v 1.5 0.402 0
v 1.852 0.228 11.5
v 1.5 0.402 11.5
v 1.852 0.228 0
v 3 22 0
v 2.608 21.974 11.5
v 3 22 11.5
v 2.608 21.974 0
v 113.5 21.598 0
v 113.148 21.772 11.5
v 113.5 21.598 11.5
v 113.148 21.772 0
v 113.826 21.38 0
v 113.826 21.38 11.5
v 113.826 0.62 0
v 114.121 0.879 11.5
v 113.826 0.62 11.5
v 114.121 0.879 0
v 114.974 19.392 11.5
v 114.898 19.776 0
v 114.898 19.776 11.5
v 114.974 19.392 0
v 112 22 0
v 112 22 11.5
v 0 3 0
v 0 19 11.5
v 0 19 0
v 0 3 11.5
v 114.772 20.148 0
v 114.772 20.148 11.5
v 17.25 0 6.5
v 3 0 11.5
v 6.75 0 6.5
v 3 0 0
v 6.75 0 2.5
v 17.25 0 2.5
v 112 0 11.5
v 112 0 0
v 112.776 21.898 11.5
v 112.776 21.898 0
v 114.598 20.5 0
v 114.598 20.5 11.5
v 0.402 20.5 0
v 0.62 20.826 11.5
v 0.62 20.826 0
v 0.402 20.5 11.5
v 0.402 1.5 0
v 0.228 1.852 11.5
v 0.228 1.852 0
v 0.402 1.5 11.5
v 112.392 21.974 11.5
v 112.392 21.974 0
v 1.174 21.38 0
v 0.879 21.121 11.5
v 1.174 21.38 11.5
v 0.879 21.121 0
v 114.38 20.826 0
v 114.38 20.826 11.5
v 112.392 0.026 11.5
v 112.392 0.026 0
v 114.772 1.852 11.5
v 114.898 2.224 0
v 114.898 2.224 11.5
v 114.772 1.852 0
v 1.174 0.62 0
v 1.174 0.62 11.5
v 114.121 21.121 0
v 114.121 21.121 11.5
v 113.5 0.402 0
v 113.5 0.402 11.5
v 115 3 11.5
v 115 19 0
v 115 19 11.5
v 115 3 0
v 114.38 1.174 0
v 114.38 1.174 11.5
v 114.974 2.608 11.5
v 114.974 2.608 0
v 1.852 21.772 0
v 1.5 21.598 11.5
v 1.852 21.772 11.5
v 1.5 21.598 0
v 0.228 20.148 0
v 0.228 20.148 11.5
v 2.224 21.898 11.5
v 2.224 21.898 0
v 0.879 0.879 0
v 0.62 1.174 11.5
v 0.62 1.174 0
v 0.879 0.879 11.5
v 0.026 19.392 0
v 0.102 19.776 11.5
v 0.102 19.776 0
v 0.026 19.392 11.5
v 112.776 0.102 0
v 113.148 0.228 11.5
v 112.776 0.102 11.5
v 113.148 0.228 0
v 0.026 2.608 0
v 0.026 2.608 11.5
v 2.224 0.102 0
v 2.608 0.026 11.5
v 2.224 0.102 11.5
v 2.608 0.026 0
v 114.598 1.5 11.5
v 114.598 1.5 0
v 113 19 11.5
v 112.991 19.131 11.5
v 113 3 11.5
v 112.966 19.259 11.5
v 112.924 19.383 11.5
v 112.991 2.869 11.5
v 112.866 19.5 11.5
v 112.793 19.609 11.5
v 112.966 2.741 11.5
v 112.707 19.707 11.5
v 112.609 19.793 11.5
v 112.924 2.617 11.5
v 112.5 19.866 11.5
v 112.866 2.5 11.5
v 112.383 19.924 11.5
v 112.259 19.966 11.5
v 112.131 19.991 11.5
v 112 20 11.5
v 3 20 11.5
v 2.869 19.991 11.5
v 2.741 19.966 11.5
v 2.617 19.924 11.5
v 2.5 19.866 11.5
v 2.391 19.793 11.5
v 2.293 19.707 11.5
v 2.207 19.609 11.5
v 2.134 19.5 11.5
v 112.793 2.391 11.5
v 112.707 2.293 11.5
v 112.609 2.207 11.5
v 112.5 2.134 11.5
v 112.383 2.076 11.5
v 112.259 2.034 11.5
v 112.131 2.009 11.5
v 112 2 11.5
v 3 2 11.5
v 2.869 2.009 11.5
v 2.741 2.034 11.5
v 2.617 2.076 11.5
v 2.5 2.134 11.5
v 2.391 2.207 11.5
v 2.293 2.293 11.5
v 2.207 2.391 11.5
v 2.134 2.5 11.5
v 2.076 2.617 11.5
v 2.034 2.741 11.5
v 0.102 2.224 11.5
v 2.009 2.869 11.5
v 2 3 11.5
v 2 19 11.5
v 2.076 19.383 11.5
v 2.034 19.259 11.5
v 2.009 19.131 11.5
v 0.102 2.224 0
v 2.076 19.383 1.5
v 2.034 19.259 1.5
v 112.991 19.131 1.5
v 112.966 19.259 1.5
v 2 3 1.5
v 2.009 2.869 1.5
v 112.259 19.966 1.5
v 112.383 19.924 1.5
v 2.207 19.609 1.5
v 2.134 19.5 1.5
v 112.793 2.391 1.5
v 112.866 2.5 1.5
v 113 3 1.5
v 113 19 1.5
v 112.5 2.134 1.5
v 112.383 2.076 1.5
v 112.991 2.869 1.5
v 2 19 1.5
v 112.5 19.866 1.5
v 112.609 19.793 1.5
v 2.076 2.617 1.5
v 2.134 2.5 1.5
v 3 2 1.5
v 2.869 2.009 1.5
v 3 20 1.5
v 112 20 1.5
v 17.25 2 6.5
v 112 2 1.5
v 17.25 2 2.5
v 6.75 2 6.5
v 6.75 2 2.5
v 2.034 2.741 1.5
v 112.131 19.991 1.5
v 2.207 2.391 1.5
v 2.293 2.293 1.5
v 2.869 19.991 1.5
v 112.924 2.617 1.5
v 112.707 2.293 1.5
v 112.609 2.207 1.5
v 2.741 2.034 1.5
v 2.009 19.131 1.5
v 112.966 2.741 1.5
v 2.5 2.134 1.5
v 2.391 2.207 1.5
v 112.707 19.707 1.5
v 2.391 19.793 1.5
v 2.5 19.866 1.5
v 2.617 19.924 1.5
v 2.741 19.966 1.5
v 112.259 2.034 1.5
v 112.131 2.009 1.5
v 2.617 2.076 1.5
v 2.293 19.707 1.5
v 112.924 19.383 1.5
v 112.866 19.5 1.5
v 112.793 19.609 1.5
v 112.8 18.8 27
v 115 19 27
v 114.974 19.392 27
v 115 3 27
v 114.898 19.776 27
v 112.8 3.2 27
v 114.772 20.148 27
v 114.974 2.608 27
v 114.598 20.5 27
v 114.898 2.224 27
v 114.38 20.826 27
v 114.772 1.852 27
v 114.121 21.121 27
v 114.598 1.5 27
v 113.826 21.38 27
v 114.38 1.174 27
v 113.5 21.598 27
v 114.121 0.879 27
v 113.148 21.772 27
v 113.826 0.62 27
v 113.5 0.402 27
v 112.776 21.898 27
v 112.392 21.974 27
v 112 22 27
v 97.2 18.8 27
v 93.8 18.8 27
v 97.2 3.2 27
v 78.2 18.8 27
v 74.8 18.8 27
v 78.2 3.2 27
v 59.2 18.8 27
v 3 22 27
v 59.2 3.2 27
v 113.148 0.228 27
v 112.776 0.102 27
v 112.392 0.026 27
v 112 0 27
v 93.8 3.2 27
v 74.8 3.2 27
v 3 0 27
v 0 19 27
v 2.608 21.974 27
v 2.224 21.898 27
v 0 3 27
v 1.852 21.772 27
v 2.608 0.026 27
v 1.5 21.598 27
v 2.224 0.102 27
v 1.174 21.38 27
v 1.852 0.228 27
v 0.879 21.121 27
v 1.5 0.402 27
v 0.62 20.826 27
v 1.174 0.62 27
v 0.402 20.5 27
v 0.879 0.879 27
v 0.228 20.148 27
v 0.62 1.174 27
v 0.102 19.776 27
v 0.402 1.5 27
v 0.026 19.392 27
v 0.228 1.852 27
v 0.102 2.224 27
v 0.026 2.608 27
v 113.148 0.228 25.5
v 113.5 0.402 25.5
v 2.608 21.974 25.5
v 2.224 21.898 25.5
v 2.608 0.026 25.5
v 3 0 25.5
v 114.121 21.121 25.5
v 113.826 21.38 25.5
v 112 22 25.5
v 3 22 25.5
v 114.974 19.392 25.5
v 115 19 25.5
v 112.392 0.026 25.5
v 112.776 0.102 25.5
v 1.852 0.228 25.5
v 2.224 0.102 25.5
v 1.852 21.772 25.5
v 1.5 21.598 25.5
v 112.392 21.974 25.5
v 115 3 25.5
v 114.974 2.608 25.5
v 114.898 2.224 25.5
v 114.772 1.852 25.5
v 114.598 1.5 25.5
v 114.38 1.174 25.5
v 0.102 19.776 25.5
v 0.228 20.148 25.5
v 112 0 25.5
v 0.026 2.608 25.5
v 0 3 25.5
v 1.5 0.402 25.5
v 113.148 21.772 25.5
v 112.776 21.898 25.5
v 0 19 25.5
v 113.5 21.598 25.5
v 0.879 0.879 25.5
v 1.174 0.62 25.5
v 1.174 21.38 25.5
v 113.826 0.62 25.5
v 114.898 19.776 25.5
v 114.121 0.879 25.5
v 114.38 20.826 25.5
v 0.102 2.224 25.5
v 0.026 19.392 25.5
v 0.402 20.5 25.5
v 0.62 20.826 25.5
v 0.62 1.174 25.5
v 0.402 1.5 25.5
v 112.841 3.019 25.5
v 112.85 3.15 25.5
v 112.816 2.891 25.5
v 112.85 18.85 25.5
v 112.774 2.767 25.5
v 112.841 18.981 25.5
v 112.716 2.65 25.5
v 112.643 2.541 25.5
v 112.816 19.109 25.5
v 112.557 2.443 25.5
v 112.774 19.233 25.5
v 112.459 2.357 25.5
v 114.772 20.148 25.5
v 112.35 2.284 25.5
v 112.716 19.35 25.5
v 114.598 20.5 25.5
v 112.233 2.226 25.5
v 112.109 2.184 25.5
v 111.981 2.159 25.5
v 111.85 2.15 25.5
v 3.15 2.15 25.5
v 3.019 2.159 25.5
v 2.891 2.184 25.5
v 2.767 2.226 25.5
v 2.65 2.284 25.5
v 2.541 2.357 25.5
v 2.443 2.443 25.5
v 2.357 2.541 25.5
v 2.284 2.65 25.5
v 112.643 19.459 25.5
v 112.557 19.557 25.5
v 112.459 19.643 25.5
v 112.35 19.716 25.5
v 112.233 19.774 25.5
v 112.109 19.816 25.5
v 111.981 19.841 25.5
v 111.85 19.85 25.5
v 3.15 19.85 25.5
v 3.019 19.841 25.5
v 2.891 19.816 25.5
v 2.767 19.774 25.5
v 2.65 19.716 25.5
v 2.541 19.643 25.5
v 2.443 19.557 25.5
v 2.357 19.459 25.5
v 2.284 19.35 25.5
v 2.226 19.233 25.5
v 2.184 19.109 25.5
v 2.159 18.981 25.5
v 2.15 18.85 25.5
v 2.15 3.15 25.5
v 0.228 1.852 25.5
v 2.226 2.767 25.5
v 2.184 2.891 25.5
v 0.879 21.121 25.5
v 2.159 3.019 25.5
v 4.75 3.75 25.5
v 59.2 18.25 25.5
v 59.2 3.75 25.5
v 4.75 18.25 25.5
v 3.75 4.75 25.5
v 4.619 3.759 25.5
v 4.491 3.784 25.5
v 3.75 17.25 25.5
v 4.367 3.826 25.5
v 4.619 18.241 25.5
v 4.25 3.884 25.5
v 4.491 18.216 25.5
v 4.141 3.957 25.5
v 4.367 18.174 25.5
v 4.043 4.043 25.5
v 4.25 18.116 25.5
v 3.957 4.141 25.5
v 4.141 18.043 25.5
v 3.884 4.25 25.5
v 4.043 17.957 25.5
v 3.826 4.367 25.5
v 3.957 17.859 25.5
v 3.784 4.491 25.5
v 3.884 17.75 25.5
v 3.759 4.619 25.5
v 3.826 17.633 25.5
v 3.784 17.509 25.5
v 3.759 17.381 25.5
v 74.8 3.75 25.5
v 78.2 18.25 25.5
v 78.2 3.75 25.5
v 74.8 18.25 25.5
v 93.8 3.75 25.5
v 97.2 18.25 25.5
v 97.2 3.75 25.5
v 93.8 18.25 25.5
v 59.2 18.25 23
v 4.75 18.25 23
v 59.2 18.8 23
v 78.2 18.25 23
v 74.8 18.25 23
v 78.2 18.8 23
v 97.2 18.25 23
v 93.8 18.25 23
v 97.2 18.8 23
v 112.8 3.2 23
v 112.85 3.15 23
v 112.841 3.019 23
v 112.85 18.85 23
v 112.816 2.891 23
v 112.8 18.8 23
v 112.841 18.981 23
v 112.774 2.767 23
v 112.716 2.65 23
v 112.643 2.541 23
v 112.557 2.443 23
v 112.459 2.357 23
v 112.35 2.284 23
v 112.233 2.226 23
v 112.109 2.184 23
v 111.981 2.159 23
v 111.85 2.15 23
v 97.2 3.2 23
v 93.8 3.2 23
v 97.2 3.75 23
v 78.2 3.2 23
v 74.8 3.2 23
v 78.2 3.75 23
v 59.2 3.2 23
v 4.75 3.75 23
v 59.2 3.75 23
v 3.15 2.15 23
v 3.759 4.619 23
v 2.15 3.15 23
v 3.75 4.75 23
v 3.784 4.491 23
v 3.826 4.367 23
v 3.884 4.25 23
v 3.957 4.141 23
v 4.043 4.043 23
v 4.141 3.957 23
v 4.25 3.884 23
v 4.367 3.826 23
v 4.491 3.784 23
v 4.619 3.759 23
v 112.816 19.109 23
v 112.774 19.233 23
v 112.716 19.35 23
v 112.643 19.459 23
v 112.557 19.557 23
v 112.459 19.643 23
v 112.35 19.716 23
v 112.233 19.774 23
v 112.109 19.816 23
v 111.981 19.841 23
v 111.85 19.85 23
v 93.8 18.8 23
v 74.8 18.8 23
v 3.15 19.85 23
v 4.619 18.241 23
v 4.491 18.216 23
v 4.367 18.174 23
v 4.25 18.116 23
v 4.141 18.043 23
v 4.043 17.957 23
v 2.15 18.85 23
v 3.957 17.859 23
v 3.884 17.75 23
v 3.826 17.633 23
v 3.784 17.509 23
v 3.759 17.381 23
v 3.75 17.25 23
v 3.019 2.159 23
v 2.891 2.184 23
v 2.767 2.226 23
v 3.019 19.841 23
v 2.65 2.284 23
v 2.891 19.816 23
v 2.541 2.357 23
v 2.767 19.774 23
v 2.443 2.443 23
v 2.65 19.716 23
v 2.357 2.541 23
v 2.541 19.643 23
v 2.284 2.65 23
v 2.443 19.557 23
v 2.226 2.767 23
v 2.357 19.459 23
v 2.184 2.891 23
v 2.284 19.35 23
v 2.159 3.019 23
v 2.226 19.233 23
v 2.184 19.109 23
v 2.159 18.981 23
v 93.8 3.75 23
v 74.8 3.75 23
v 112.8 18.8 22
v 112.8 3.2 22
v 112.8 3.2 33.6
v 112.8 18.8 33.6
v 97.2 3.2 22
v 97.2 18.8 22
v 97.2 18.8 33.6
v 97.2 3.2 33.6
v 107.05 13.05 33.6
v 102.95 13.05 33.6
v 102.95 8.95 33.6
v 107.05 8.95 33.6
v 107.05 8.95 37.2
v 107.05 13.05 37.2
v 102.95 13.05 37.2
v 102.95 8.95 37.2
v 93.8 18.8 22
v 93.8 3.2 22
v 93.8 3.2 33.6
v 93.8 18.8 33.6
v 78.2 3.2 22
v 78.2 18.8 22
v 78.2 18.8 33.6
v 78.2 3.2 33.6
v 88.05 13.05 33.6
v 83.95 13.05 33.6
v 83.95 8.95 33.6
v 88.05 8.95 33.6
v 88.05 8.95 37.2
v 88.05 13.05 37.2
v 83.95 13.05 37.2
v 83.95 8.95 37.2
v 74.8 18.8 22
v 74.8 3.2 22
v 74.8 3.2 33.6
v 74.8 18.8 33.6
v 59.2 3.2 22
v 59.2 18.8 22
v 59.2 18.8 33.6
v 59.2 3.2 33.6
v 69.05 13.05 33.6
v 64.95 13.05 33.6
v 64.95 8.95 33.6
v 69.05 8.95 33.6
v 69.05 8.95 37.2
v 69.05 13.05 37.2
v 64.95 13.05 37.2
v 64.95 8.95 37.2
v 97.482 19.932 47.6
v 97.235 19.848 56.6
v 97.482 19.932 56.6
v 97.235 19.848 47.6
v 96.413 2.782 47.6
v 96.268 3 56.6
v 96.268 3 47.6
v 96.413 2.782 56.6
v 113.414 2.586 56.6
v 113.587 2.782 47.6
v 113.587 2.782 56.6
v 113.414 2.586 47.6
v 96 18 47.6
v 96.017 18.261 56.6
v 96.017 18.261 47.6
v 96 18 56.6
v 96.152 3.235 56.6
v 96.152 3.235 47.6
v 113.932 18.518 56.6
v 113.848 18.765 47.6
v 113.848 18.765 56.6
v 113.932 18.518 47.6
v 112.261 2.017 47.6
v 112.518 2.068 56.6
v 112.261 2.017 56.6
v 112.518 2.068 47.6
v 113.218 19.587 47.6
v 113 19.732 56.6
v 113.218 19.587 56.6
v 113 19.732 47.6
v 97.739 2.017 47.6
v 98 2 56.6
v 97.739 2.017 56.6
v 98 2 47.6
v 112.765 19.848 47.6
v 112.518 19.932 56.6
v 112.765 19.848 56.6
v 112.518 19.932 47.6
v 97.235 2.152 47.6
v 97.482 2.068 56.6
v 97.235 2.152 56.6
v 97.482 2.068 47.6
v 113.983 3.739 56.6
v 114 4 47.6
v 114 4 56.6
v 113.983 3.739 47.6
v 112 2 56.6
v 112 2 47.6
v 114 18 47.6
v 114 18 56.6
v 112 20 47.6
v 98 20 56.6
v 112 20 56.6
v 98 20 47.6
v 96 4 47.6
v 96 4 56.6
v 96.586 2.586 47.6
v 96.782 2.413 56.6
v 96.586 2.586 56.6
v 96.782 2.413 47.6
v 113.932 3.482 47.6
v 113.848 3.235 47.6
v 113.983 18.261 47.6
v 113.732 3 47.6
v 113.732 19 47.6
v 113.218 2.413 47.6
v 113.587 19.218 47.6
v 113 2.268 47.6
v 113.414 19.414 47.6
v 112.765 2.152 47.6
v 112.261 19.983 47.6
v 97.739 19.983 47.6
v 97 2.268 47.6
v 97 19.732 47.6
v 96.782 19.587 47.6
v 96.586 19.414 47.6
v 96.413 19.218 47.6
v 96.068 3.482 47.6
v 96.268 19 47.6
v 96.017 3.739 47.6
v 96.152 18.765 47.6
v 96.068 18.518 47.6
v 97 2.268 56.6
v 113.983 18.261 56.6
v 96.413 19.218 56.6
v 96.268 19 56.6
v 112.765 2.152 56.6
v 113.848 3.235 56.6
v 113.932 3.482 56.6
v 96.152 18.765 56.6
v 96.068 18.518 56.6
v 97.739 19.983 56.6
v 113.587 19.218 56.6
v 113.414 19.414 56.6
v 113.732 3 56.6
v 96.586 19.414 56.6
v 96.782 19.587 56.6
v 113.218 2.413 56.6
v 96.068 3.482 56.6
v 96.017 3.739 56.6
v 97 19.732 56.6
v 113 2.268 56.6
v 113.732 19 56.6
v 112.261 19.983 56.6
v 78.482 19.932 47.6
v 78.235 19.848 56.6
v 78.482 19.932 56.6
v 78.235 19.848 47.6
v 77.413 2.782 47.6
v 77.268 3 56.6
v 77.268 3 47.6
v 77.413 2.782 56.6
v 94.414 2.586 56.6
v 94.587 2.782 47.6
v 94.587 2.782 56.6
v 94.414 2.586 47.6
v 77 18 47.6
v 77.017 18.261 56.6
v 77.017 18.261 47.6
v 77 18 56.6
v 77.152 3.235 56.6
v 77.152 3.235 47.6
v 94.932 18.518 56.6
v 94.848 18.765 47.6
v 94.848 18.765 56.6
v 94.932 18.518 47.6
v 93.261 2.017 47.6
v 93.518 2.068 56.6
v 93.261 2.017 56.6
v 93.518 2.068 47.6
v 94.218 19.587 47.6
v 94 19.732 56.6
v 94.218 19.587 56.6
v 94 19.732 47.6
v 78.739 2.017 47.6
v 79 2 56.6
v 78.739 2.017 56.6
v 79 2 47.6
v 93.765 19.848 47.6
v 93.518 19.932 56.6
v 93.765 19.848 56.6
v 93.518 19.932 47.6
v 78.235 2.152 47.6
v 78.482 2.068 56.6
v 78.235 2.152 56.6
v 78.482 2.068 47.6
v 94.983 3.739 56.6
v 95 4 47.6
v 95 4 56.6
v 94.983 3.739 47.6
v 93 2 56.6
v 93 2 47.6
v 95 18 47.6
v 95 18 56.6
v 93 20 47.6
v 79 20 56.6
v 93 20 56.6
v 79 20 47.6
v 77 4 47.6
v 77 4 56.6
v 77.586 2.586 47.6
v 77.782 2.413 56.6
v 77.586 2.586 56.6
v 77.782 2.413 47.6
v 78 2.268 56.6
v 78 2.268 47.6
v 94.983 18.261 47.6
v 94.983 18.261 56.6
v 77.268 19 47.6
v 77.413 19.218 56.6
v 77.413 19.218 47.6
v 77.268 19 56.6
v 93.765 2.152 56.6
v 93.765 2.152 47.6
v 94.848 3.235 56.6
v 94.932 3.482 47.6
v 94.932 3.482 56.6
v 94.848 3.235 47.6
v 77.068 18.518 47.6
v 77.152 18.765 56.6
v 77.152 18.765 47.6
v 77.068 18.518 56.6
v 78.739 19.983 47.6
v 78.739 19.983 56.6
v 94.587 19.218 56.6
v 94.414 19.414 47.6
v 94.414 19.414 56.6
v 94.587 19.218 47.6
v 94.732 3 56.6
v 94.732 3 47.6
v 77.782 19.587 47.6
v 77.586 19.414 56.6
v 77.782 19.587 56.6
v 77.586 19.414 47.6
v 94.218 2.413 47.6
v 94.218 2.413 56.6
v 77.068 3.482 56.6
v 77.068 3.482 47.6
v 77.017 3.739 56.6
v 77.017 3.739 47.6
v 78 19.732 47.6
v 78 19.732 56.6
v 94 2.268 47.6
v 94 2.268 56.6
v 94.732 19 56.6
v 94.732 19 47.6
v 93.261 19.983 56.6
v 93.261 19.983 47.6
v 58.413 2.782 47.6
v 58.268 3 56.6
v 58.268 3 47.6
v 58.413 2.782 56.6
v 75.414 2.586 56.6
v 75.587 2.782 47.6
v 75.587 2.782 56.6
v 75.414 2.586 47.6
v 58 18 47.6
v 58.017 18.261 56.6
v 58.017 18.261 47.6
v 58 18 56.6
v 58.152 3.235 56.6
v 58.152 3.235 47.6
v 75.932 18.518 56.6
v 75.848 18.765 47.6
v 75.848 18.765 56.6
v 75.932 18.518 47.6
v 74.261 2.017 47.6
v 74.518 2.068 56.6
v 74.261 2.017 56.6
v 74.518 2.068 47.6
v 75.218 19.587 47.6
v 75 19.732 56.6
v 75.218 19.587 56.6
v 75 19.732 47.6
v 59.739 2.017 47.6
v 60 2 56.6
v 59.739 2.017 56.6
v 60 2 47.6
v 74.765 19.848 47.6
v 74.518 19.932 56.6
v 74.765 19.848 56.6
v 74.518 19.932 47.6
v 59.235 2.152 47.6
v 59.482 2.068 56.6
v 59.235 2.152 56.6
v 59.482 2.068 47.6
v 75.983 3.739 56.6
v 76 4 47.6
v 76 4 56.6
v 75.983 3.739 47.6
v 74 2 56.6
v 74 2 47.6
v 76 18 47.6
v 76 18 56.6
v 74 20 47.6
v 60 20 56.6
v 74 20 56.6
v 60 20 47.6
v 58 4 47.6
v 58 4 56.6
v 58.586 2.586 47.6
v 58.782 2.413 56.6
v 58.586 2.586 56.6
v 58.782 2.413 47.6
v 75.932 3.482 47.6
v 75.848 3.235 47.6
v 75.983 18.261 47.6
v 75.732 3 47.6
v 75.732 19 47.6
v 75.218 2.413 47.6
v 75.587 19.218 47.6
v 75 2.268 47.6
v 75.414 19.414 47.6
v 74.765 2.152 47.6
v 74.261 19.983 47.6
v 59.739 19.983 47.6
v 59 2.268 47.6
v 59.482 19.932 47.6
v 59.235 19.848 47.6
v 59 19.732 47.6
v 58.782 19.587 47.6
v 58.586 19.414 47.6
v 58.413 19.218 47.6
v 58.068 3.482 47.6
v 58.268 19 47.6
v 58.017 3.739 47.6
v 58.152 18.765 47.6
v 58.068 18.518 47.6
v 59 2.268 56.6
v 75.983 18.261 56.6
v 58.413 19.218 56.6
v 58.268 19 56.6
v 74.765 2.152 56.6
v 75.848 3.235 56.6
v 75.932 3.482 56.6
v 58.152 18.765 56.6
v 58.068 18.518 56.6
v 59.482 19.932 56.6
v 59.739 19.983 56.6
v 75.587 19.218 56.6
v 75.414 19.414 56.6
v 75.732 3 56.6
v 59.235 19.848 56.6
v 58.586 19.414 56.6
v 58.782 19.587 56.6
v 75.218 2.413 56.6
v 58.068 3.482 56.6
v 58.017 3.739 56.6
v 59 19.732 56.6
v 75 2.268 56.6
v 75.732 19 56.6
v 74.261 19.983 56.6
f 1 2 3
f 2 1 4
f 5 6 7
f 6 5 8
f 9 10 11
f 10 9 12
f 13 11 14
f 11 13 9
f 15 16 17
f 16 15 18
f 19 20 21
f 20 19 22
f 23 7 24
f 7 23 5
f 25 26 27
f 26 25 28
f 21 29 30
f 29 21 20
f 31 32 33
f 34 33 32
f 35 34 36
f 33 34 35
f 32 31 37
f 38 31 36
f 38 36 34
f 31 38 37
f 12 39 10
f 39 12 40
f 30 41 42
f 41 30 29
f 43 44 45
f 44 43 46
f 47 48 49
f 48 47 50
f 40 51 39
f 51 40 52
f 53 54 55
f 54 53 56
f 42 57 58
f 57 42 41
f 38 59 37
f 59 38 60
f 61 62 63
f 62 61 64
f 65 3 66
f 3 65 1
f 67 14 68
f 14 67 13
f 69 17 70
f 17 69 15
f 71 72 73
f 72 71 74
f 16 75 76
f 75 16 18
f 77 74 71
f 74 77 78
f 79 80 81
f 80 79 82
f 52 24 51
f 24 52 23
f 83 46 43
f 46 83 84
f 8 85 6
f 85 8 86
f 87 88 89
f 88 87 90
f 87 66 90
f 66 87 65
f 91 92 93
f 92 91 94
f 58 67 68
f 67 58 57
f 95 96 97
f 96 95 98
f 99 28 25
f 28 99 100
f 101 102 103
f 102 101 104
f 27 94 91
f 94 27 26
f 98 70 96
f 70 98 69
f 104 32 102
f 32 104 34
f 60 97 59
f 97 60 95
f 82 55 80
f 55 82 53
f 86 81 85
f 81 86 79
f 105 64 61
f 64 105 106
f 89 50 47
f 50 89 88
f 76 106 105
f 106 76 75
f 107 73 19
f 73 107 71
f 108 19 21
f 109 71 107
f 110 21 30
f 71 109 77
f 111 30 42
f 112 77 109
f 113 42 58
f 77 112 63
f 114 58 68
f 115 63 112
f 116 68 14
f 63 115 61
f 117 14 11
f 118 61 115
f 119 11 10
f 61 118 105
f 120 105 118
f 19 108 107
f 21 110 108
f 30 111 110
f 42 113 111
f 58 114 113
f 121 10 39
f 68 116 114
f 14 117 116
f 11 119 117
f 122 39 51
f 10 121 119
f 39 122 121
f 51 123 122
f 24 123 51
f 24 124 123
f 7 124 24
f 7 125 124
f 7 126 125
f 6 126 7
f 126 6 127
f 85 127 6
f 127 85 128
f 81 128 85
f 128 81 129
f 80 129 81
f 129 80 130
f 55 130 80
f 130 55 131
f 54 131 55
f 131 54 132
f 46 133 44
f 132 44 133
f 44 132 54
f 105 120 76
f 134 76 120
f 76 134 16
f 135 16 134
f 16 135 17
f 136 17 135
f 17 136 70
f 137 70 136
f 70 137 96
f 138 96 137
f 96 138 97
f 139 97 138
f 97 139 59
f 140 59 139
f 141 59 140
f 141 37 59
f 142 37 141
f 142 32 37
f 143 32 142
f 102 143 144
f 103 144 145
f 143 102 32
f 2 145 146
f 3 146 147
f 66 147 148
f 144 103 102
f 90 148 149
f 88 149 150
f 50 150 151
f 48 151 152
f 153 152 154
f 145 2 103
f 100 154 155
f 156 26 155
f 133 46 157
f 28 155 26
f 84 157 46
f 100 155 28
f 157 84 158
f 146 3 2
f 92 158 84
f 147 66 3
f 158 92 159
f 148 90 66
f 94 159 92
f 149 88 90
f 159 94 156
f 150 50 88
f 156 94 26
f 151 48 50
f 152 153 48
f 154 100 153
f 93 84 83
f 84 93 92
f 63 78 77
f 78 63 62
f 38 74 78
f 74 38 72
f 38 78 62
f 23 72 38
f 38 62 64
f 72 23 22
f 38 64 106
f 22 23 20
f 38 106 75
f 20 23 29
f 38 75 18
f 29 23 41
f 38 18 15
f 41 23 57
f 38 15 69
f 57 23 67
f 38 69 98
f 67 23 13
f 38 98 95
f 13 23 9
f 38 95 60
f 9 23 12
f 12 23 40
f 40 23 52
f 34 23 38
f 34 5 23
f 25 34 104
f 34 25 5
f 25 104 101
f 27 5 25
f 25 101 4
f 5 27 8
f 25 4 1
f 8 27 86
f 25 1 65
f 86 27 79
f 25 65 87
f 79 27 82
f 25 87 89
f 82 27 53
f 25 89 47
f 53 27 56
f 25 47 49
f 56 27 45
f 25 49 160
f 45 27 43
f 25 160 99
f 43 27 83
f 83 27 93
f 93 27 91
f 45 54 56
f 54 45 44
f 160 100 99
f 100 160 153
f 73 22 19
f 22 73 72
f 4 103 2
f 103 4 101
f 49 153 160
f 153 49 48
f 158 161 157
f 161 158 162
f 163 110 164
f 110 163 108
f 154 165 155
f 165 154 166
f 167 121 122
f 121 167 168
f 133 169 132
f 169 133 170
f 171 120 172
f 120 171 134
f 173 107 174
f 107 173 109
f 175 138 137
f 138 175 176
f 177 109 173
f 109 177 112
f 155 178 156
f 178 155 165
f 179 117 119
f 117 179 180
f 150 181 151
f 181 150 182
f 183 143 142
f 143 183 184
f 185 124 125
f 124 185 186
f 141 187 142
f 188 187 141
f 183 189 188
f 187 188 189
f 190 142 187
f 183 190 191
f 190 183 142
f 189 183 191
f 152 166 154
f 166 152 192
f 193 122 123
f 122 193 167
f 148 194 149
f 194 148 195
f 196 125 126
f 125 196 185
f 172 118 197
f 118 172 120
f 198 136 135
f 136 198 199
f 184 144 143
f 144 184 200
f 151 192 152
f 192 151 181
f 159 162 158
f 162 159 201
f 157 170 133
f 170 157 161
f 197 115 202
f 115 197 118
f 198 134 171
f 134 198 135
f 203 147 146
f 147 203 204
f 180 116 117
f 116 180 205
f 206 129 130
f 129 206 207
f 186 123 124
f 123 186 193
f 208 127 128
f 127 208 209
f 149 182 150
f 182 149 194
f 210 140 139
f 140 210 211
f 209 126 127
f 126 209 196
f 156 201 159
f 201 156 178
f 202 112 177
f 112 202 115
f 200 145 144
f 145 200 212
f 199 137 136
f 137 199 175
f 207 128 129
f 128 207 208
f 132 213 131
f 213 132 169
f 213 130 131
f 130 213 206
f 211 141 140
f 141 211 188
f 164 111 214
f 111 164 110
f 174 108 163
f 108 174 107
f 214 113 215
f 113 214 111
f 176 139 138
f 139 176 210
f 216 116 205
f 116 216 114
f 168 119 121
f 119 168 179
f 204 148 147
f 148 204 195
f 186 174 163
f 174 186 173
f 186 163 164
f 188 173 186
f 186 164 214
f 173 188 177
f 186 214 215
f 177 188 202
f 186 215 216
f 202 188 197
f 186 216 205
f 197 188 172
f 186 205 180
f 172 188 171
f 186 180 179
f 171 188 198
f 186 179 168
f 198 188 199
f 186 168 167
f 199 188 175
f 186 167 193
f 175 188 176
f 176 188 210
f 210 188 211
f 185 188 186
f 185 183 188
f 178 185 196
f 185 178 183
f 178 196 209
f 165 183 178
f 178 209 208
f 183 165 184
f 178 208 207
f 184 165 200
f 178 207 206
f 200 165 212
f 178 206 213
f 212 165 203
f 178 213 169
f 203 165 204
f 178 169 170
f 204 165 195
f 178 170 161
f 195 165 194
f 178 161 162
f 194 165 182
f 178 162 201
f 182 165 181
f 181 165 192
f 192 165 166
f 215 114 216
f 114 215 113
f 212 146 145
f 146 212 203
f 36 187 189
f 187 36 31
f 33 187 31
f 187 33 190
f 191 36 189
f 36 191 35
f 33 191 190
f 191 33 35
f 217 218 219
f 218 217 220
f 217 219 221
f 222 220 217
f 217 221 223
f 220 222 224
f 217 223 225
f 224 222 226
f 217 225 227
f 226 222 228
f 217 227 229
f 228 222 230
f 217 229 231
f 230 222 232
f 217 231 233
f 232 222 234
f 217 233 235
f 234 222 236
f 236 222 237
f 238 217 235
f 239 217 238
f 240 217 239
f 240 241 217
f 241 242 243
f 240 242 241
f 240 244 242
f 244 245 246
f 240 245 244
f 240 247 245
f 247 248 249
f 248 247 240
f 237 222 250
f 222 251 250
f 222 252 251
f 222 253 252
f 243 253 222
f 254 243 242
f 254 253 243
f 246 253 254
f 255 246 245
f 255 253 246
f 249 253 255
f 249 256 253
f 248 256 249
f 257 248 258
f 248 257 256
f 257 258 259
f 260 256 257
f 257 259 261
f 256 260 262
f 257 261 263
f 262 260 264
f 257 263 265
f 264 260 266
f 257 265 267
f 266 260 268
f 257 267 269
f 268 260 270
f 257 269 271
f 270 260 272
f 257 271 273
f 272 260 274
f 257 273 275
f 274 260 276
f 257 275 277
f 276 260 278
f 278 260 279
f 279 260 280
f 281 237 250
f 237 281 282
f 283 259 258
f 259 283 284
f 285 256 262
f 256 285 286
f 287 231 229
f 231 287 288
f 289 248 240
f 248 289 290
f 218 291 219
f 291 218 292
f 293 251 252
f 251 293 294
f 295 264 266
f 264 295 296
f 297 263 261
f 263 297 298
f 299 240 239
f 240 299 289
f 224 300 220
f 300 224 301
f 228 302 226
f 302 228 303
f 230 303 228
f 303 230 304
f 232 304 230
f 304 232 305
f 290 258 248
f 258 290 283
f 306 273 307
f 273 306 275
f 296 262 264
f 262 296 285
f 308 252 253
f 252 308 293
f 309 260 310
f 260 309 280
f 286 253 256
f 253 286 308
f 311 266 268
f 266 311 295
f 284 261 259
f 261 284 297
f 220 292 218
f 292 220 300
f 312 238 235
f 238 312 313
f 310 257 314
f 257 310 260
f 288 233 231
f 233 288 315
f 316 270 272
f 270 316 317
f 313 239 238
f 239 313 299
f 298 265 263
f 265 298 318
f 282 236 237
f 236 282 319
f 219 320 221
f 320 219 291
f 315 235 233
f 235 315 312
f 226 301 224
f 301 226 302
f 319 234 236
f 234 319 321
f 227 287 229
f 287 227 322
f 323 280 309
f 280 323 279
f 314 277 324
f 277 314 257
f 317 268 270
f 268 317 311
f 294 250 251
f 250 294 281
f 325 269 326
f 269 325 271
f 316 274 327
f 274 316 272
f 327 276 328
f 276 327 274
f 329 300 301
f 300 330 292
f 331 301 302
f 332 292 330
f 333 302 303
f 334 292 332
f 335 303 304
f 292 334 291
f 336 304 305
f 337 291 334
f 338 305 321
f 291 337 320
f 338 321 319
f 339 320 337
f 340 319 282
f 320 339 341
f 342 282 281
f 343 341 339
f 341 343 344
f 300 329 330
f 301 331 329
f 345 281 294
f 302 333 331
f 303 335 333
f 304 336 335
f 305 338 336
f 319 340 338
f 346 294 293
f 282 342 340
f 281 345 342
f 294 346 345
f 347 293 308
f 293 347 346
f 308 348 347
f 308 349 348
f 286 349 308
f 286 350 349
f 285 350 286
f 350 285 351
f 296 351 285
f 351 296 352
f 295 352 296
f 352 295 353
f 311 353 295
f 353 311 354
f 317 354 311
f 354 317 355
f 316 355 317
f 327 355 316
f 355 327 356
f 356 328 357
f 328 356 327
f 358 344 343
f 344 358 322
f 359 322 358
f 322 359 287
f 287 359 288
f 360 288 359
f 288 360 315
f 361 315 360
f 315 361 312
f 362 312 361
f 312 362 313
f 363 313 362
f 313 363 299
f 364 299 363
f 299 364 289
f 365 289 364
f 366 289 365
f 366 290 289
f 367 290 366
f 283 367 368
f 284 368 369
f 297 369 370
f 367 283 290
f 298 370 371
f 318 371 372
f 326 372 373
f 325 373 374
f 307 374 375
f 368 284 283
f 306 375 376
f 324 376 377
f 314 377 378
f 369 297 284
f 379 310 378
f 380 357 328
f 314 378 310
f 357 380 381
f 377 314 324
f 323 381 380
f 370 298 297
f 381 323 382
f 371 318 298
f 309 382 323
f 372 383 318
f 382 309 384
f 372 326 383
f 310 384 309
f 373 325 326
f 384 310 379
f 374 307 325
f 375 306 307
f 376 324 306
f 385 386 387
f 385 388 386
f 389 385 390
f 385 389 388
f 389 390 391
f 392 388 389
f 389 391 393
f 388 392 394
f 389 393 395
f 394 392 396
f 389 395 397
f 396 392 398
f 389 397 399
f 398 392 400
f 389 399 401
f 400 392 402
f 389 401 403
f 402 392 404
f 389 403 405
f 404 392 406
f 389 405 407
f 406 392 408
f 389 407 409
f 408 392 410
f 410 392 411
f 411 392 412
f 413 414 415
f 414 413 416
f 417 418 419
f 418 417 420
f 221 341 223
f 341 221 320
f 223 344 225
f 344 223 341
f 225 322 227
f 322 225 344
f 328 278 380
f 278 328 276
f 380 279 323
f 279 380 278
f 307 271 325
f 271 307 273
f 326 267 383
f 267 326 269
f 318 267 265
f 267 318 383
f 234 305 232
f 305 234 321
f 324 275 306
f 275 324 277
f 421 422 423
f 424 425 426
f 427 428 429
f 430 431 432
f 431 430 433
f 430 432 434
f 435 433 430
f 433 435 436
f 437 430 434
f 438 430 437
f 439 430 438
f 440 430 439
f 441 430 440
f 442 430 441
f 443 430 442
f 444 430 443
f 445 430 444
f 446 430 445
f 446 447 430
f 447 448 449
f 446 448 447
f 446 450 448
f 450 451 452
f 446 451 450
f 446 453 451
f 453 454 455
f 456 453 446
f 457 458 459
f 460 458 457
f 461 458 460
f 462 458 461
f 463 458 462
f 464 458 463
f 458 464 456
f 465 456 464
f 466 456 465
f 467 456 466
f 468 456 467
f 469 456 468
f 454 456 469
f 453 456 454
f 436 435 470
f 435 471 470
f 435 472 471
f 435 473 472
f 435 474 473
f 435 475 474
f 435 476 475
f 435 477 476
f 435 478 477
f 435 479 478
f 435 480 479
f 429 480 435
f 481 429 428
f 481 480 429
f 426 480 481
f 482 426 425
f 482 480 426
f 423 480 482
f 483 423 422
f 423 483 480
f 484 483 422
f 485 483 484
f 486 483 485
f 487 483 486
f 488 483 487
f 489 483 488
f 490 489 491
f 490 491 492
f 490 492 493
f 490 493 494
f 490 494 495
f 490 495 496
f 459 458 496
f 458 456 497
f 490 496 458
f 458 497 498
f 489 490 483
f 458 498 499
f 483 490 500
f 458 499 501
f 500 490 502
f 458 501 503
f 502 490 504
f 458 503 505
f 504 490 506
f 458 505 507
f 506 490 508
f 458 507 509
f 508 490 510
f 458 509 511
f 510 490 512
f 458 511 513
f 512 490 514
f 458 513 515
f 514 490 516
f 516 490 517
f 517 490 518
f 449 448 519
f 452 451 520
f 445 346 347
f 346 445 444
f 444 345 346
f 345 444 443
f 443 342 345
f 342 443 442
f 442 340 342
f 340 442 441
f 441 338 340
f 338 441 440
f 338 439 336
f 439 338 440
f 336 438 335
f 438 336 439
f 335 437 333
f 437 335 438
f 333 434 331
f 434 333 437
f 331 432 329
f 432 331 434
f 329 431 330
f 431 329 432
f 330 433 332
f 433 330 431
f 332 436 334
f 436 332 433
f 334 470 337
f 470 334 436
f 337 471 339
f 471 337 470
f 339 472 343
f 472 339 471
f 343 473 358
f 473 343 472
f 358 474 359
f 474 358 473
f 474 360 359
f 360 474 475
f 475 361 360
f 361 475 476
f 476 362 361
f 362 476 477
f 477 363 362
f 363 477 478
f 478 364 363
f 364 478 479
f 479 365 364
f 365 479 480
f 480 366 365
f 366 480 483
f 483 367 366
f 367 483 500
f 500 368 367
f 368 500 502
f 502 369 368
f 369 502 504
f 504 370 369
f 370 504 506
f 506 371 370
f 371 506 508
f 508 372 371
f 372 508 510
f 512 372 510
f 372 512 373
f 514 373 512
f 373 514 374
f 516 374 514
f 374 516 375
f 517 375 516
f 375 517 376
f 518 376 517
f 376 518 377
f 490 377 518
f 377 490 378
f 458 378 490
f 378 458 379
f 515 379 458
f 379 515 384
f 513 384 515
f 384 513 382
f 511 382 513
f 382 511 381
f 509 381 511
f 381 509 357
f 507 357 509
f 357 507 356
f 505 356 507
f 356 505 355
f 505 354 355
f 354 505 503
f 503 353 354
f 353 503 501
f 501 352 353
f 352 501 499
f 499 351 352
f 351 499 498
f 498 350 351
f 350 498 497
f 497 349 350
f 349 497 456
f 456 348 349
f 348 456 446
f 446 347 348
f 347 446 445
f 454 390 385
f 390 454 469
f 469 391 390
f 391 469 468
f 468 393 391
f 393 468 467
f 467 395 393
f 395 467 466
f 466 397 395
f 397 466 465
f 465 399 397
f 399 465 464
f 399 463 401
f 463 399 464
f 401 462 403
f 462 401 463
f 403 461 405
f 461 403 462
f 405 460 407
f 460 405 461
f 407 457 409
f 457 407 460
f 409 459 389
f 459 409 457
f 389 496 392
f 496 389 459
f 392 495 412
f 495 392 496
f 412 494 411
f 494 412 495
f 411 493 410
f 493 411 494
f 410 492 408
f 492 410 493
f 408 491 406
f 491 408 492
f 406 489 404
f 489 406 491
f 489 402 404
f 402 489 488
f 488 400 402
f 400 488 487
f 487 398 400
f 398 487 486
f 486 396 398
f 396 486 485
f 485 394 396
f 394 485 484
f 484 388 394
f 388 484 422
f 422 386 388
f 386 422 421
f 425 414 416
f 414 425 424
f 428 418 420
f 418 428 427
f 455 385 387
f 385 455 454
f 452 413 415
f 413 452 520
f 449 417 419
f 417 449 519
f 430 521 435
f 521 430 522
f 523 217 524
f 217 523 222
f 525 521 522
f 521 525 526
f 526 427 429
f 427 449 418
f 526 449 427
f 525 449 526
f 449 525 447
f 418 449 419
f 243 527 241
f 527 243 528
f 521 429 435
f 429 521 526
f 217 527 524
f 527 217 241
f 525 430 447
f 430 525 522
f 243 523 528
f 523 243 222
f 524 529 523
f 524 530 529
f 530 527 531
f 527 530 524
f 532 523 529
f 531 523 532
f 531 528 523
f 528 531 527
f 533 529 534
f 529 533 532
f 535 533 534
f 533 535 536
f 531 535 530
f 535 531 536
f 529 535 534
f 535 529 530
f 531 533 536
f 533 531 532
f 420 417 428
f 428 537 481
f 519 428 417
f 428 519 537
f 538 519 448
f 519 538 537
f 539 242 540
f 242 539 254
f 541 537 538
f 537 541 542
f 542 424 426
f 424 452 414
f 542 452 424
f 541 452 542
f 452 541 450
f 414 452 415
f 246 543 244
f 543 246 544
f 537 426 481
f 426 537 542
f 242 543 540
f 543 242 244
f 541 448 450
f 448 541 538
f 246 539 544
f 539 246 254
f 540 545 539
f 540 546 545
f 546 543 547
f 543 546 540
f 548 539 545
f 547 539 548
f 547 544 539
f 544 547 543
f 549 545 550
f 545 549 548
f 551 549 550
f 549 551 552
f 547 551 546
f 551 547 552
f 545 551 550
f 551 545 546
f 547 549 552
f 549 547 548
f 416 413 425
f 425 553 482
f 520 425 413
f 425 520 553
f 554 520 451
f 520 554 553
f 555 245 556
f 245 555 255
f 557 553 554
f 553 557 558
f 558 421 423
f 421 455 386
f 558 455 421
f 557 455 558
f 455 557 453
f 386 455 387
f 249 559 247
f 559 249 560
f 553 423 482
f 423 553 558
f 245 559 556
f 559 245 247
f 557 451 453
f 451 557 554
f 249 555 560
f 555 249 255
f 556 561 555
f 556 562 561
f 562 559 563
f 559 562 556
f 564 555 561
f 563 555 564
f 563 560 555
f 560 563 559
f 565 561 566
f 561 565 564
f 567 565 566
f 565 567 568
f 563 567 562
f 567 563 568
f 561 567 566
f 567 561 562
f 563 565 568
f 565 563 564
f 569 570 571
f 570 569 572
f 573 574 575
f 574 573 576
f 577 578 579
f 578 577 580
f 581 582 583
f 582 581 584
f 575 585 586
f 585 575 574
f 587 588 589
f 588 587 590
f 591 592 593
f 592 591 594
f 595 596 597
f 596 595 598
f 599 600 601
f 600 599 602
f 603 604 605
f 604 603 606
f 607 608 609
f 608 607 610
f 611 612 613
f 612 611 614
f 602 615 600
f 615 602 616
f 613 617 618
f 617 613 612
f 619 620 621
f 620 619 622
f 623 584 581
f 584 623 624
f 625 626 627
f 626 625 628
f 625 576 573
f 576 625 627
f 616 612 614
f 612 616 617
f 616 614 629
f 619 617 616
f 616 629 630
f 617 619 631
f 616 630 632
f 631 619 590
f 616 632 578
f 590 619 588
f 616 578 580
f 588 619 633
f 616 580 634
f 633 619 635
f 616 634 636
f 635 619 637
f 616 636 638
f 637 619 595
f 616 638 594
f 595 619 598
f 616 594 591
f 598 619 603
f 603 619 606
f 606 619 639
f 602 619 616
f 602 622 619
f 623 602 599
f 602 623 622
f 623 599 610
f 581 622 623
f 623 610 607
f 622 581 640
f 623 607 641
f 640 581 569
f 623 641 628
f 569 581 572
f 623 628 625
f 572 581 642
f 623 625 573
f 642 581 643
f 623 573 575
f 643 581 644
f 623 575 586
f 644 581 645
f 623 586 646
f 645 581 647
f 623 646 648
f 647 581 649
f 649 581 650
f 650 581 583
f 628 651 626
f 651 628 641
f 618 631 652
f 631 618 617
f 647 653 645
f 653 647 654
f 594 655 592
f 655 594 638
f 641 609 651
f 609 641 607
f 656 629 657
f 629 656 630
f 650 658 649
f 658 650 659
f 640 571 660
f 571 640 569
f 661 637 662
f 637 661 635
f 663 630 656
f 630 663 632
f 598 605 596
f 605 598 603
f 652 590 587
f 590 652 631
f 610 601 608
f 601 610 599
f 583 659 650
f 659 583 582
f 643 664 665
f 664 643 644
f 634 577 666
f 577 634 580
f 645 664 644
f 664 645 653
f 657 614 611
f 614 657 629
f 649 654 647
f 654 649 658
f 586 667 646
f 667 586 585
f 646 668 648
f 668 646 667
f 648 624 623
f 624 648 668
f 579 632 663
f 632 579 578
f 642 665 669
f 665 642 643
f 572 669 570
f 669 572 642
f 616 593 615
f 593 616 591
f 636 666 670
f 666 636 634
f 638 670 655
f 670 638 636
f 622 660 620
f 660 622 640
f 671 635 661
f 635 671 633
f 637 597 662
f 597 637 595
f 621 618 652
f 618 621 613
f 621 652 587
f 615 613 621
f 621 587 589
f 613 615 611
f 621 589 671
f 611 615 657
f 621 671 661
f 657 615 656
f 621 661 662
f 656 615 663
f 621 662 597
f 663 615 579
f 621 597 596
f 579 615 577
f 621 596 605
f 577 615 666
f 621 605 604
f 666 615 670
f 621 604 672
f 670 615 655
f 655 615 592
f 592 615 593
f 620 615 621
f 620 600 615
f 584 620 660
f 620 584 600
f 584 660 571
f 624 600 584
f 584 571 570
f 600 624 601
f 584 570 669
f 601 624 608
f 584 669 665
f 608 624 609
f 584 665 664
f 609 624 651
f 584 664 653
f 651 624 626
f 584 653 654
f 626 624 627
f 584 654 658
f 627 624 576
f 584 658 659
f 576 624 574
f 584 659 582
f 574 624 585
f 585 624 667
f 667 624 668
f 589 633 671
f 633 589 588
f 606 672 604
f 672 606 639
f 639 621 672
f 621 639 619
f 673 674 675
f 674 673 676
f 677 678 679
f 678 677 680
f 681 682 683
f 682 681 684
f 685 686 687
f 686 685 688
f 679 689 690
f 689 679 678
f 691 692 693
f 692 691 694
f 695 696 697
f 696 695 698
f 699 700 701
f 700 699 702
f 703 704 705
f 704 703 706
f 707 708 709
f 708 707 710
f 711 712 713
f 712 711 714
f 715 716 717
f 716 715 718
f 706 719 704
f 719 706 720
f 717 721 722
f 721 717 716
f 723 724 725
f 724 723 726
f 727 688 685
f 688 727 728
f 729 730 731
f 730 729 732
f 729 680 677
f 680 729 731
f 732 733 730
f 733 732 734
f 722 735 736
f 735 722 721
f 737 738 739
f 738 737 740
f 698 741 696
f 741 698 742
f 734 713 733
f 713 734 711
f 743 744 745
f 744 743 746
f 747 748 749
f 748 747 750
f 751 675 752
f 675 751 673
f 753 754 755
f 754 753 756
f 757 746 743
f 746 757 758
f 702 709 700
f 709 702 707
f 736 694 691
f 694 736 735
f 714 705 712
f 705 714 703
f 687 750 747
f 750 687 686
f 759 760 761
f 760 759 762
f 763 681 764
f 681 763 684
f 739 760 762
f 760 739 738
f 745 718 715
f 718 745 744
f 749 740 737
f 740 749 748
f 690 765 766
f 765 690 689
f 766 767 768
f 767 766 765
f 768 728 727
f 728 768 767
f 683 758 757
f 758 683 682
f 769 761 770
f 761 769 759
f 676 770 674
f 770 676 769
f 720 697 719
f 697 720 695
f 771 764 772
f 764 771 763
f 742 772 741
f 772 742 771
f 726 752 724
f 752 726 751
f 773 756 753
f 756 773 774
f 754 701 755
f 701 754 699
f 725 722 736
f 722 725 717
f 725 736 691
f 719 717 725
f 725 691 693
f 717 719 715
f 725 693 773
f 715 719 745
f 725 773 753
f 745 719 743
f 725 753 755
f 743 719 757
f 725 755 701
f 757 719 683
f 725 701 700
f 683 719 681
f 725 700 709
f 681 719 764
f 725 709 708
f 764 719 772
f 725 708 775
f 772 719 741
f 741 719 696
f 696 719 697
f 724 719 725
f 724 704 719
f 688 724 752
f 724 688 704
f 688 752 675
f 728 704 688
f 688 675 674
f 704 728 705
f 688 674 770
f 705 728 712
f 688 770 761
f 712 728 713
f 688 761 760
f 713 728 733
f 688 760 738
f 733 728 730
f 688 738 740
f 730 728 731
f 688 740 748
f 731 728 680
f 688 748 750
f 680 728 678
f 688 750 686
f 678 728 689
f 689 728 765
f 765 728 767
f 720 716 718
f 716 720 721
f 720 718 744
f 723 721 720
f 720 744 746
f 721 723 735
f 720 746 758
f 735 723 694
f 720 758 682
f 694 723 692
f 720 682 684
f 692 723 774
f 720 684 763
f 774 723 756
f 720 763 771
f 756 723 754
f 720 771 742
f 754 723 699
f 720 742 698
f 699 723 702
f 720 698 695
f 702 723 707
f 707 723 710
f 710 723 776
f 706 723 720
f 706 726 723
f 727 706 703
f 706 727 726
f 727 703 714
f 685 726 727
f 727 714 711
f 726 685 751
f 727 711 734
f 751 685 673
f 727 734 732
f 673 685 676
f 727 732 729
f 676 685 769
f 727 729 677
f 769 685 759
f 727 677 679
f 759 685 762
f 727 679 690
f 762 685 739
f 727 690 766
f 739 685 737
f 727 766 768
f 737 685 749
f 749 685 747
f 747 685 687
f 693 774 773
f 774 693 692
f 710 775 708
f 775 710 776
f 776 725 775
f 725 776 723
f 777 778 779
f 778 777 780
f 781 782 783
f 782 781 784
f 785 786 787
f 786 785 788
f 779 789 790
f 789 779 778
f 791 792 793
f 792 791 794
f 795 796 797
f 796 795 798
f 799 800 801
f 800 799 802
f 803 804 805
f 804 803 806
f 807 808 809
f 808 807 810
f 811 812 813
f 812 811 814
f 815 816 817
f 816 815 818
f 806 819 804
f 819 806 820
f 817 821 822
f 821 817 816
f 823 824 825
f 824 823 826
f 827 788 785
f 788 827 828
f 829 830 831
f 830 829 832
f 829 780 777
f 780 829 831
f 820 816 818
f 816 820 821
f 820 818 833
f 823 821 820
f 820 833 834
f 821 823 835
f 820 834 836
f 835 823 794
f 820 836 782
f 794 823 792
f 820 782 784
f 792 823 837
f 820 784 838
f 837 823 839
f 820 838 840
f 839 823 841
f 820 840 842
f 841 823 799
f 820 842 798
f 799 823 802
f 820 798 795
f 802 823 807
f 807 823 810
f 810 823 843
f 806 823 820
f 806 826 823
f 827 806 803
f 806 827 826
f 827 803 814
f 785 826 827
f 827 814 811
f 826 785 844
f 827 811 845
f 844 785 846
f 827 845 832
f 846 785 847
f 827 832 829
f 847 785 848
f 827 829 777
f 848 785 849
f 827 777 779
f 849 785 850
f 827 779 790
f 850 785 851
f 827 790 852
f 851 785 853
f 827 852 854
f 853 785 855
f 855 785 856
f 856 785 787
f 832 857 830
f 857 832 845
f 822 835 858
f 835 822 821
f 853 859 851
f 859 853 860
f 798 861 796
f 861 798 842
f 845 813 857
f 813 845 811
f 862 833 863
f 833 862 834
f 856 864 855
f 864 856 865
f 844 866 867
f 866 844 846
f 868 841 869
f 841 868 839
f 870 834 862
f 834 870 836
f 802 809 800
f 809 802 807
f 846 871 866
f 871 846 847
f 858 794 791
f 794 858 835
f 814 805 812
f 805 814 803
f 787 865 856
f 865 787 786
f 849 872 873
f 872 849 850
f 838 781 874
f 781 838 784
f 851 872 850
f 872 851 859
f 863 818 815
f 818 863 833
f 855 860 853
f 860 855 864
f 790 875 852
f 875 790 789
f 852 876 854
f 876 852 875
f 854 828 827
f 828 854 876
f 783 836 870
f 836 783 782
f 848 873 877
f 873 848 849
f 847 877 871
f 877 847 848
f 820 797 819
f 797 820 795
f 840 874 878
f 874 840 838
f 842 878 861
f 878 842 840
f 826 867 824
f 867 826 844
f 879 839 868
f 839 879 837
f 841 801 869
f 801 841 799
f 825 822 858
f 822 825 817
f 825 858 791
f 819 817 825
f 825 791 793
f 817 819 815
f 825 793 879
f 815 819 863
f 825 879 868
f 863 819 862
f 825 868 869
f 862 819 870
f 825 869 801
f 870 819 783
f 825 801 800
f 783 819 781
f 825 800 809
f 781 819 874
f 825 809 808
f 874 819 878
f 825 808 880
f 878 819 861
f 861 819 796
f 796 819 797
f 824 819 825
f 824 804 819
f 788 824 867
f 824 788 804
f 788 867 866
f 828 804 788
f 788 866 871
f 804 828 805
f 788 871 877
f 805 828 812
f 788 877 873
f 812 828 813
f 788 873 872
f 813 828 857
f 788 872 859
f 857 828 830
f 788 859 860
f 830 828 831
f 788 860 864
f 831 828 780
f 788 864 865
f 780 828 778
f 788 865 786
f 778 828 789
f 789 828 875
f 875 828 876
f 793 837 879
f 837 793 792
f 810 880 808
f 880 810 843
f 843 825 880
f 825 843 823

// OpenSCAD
// K1 (Keys v1) — printable 2-part concept, v0.4
// Parts: tray (electronics cavity) + friction-fit lid that doubles as an
// MX switch plate. Keycaps are printed separately (any MX cross-stem cap
// works — e.g. the Lego-style caps).
//
// Sized for MX-style clicky switches (PCB/plate mount, through-hole):
//   body 15.6 sq, plate cutout 14.0 sq in a 1.5mm plate (clips grab the
//   plate underside), lower housing ~5mm below plate, pins ~3.3mm more.
// Body/plug dimensions remain placeholders until the MacBook is measured.
//
// Render one part at a time:
//   openscad -D 'part="tray"' -o k1_tray.stl k1_v1.scad
//   openscad -D 'part="lid"'  -o k1_lid.stl  k1_v1.scad   (print orientation)
//   part="assembly" / part="exploded" for viewing (includes mock switches/caps)

part = "exploded"; // tray | lid | assembly | exploded

$fn = 48;

/* ---------- Body ---------- */
body_len  = 115;   // rear (port) to laptop front edge
body_wid  = 22;
body_rad  = 3;

wall      = 2;     // side wall thickness
floor_th  = 1.5;
cav_depth = 10;    // below-plate room: 5 switch + 3.3 pins + wiring

/* ---------- Lid = switch plate ---------- */
lid_th        = 1.5;   // MX clips are made for a 1.5mm plate — don't change
lid_rim_depth = 2.5;   // perimeter rim that friction-fits into the tray
lid_rim_wid   = 1.6;
fit_clr       = 0.15;  // per-side clearance, tune per printer

tray_ht = floor_th + cav_depth;          // 11.5
body_ht = tray_ht + lid_th;              // 13 (shell only, keys stick up)

/* ---------- Keys (MX) ---------- */
key_count       = 3;
key_pitch       = 19;    // MX standard
keys_from_front = 10;    // first key center from the front end
plate_hole      = 14.1;  // 14.0 nominal + print tolerance
sw_body         = 15.6;  // switch housing (for clearance checks / mock)
sw_upper_ht     = 6.6;   // housing above plate
sw_stem_ht      = 3.6;   // cross stem above housing

/* ---------- Keycap envelope (for mock/clearance only, printed separately) ---------- */
cap_size = 18;   // standard MX cap footprint, < 19 pitch
cap_ht   = 9;    // roughly the Lego-style cap height

/* ---------- USB-C slot (inner wall, near rear) ---------- */
plug_from_rear = 12;   // slot center from rear end
slot_w = 10.5;         // fits a male USB-C breakout plug
slot_h = 4;
slot_z = floor_th + 1; // bottom of slot above cavity floor

/* ---------- Derived ---------- */
cav_len = body_len - 2 * wall;
cav_wid = body_wid - 2 * wall;

function key_cx(i) = body_len - keys_from_front - i * key_pitch;

/* ---------- Helpers ---------- */
module rounded_box(l, w, h, r) {
    hull()
        for (x = [r, l - r], y = [r, w - r])
            translate([x, y, 0]) cylinder(h = h, r = r);
}

/* ---------- Parts ---------- */
// Frame: X rear->front, Y=0 face touches the laptop, Z up.

module tray() {
    difference() {
        rounded_box(body_len, body_wid, tray_ht, body_rad);
        // cavity
        translate([wall, wall, floor_th])
            rounded_box(cav_len, cav_wid, tray_ht, 1);
        // USB-C slot through the inner (Y=0) wall
        translate([plug_from_rear - slot_w / 2, -1, slot_z])
            cube([slot_w, wall + 2, slot_h]);
    }
}

// Modeled in assembly orientation: plate z=0..lid_th, rim hangs below.
module lid_assembled() {
    difference() {
        union() {
            rounded_box(body_len, body_wid, lid_th, body_rad);
            // friction rim: band just inside the cavity walls
            translate([0, 0, -lid_rim_depth])
                linear_extrude(lid_rim_depth)
                    difference() {
                        translate([wall + fit_clr, wall + fit_clr])
                            projection()
                                rounded_box(cav_len - 2 * fit_clr,
                                            cav_wid - 2 * fit_clr, 1, 1);
                        translate([wall + fit_clr + lid_rim_wid,
                                   wall + fit_clr + lid_rim_wid])
                            projection()
                                rounded_box(cav_len - 2 * (fit_clr + lid_rim_wid),
                                            cav_wid - 2 * (fit_clr + lid_rim_wid), 1, 1);
                    }
        }
        // MX plate cutouts — switches drop in from the top and clip under
        for (i = [0 : key_count - 1])
            translate([key_cx(i) - plate_hole / 2,
                       (body_wid - plate_hole) / 2,
                       -lid_rim_depth - 1])
                cube([plate_hole, plate_hole, lid_rim_depth + lid_th + 2]);
    }
}

// Mock MX switch for assembly views only (not exported)
module switch_mock() {
    color("gray") {
        translate([-sw_body / 2, -sw_body / 2, -5]) cube([sw_body, sw_body, 5]);
        translate([-sw_body / 2, -sw_body / 2, 0])  cube([sw_body, sw_body, sw_upper_ht]);
        translate([-2.05, -2.05, sw_upper_ht])      cube([4.1, 4.1, sw_stem_ht]);
    }
}

/* ---------- Views ---------- */

module assembly(explode = 0) {
    plate_top = tray_ht + lid_th;
    tray();
    translate([0, 0, tray_ht + explode]) lid_assembled();
    for (i = [0 : key_count - 1]) {
        translate([key_cx(i), body_wid / 2, plate_top + explode])
            switch_mock();
        // mock keycap (printed separately, seats over the stem)
        color("steelblue")
            translate([key_cx(i) - cap_size / 2, (body_wid - cap_size) / 2,
                       plate_top + sw_upper_ht + explode * 2])
                rounded_box(cap_size, cap_size, cap_ht, 2);
    }
}

if (part == "tray")          tray();
else if (part == "lid")      translate([0, body_wid, lid_th]) rotate([180, 0, 0]) lid_assembled();
else if (part == "assembly") assembly(0);
else if (part == "exploded") assembly(14);
